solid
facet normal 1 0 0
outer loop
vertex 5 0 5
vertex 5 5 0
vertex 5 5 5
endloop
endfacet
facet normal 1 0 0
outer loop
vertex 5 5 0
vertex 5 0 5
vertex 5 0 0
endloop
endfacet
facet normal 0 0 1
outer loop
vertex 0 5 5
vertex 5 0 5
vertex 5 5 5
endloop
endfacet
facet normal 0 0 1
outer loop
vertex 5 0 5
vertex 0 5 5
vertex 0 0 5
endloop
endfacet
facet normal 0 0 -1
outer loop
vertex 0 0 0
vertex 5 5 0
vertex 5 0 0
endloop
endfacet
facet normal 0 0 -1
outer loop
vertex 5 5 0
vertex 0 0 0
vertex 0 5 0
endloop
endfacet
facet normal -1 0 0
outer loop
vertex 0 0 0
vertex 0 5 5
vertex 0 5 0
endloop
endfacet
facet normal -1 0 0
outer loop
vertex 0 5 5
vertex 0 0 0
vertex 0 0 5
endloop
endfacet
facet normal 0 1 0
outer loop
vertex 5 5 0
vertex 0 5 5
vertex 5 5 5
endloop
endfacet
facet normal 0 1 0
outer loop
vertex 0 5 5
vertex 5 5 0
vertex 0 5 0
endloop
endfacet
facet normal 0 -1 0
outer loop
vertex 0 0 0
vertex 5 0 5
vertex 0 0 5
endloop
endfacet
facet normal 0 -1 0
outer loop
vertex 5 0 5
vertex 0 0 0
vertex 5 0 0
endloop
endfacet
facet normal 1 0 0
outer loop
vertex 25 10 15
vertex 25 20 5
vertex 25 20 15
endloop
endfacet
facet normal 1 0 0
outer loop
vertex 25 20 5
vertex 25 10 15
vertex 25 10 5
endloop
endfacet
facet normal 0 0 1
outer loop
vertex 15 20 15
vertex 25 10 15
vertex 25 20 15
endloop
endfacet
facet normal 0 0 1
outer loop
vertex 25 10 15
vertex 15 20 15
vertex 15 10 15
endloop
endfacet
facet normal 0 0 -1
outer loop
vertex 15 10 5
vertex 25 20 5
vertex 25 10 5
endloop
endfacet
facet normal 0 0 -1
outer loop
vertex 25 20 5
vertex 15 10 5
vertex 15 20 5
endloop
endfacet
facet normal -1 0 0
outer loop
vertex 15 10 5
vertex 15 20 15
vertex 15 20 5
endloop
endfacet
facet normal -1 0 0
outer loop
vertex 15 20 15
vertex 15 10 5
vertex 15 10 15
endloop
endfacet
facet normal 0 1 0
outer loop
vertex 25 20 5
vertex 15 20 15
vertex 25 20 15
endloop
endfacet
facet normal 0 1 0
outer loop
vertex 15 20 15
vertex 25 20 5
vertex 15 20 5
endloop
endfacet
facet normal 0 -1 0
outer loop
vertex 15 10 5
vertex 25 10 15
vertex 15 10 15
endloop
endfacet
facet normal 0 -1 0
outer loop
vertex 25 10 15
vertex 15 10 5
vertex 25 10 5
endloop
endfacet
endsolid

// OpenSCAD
module bbox() { 

    // a 3D approx. of the children projection on X axis 
    module xProjection() 
        translate([0,1/2,-1/2]) 
            linear_extrude(1) 
                hull() 
                    projection() 
                        rotate([90,0,0]) 
                            linear_extrude(1) 
                                projection() children(); 
  
    // a bounding box with an offset of 1 in all axis
    module bbx()  
        minkowski() { 
            xProjection() children(); // x axis
            rotate(-90)               // y axis
                xProjection() rotate(90) children(); 
            rotate([0,-90,0])         // z axis
                xProjection() rotate([0,90,0]) children(); 
        } 
    
    // offset children() (a cube) by -1 in all axis
    module shrink()
      intersection() {
        translate([ 1, 1, 1]) children();
        translate([-1,-1,-1]) children();
      }

   shrink() bbx() children(); 
}

module model()
  color("red") 
  union() {
    //sphere(10);
    cube(5);
    translate([15,10,5]) cube(10);
  }

model();
%bbox() model();
